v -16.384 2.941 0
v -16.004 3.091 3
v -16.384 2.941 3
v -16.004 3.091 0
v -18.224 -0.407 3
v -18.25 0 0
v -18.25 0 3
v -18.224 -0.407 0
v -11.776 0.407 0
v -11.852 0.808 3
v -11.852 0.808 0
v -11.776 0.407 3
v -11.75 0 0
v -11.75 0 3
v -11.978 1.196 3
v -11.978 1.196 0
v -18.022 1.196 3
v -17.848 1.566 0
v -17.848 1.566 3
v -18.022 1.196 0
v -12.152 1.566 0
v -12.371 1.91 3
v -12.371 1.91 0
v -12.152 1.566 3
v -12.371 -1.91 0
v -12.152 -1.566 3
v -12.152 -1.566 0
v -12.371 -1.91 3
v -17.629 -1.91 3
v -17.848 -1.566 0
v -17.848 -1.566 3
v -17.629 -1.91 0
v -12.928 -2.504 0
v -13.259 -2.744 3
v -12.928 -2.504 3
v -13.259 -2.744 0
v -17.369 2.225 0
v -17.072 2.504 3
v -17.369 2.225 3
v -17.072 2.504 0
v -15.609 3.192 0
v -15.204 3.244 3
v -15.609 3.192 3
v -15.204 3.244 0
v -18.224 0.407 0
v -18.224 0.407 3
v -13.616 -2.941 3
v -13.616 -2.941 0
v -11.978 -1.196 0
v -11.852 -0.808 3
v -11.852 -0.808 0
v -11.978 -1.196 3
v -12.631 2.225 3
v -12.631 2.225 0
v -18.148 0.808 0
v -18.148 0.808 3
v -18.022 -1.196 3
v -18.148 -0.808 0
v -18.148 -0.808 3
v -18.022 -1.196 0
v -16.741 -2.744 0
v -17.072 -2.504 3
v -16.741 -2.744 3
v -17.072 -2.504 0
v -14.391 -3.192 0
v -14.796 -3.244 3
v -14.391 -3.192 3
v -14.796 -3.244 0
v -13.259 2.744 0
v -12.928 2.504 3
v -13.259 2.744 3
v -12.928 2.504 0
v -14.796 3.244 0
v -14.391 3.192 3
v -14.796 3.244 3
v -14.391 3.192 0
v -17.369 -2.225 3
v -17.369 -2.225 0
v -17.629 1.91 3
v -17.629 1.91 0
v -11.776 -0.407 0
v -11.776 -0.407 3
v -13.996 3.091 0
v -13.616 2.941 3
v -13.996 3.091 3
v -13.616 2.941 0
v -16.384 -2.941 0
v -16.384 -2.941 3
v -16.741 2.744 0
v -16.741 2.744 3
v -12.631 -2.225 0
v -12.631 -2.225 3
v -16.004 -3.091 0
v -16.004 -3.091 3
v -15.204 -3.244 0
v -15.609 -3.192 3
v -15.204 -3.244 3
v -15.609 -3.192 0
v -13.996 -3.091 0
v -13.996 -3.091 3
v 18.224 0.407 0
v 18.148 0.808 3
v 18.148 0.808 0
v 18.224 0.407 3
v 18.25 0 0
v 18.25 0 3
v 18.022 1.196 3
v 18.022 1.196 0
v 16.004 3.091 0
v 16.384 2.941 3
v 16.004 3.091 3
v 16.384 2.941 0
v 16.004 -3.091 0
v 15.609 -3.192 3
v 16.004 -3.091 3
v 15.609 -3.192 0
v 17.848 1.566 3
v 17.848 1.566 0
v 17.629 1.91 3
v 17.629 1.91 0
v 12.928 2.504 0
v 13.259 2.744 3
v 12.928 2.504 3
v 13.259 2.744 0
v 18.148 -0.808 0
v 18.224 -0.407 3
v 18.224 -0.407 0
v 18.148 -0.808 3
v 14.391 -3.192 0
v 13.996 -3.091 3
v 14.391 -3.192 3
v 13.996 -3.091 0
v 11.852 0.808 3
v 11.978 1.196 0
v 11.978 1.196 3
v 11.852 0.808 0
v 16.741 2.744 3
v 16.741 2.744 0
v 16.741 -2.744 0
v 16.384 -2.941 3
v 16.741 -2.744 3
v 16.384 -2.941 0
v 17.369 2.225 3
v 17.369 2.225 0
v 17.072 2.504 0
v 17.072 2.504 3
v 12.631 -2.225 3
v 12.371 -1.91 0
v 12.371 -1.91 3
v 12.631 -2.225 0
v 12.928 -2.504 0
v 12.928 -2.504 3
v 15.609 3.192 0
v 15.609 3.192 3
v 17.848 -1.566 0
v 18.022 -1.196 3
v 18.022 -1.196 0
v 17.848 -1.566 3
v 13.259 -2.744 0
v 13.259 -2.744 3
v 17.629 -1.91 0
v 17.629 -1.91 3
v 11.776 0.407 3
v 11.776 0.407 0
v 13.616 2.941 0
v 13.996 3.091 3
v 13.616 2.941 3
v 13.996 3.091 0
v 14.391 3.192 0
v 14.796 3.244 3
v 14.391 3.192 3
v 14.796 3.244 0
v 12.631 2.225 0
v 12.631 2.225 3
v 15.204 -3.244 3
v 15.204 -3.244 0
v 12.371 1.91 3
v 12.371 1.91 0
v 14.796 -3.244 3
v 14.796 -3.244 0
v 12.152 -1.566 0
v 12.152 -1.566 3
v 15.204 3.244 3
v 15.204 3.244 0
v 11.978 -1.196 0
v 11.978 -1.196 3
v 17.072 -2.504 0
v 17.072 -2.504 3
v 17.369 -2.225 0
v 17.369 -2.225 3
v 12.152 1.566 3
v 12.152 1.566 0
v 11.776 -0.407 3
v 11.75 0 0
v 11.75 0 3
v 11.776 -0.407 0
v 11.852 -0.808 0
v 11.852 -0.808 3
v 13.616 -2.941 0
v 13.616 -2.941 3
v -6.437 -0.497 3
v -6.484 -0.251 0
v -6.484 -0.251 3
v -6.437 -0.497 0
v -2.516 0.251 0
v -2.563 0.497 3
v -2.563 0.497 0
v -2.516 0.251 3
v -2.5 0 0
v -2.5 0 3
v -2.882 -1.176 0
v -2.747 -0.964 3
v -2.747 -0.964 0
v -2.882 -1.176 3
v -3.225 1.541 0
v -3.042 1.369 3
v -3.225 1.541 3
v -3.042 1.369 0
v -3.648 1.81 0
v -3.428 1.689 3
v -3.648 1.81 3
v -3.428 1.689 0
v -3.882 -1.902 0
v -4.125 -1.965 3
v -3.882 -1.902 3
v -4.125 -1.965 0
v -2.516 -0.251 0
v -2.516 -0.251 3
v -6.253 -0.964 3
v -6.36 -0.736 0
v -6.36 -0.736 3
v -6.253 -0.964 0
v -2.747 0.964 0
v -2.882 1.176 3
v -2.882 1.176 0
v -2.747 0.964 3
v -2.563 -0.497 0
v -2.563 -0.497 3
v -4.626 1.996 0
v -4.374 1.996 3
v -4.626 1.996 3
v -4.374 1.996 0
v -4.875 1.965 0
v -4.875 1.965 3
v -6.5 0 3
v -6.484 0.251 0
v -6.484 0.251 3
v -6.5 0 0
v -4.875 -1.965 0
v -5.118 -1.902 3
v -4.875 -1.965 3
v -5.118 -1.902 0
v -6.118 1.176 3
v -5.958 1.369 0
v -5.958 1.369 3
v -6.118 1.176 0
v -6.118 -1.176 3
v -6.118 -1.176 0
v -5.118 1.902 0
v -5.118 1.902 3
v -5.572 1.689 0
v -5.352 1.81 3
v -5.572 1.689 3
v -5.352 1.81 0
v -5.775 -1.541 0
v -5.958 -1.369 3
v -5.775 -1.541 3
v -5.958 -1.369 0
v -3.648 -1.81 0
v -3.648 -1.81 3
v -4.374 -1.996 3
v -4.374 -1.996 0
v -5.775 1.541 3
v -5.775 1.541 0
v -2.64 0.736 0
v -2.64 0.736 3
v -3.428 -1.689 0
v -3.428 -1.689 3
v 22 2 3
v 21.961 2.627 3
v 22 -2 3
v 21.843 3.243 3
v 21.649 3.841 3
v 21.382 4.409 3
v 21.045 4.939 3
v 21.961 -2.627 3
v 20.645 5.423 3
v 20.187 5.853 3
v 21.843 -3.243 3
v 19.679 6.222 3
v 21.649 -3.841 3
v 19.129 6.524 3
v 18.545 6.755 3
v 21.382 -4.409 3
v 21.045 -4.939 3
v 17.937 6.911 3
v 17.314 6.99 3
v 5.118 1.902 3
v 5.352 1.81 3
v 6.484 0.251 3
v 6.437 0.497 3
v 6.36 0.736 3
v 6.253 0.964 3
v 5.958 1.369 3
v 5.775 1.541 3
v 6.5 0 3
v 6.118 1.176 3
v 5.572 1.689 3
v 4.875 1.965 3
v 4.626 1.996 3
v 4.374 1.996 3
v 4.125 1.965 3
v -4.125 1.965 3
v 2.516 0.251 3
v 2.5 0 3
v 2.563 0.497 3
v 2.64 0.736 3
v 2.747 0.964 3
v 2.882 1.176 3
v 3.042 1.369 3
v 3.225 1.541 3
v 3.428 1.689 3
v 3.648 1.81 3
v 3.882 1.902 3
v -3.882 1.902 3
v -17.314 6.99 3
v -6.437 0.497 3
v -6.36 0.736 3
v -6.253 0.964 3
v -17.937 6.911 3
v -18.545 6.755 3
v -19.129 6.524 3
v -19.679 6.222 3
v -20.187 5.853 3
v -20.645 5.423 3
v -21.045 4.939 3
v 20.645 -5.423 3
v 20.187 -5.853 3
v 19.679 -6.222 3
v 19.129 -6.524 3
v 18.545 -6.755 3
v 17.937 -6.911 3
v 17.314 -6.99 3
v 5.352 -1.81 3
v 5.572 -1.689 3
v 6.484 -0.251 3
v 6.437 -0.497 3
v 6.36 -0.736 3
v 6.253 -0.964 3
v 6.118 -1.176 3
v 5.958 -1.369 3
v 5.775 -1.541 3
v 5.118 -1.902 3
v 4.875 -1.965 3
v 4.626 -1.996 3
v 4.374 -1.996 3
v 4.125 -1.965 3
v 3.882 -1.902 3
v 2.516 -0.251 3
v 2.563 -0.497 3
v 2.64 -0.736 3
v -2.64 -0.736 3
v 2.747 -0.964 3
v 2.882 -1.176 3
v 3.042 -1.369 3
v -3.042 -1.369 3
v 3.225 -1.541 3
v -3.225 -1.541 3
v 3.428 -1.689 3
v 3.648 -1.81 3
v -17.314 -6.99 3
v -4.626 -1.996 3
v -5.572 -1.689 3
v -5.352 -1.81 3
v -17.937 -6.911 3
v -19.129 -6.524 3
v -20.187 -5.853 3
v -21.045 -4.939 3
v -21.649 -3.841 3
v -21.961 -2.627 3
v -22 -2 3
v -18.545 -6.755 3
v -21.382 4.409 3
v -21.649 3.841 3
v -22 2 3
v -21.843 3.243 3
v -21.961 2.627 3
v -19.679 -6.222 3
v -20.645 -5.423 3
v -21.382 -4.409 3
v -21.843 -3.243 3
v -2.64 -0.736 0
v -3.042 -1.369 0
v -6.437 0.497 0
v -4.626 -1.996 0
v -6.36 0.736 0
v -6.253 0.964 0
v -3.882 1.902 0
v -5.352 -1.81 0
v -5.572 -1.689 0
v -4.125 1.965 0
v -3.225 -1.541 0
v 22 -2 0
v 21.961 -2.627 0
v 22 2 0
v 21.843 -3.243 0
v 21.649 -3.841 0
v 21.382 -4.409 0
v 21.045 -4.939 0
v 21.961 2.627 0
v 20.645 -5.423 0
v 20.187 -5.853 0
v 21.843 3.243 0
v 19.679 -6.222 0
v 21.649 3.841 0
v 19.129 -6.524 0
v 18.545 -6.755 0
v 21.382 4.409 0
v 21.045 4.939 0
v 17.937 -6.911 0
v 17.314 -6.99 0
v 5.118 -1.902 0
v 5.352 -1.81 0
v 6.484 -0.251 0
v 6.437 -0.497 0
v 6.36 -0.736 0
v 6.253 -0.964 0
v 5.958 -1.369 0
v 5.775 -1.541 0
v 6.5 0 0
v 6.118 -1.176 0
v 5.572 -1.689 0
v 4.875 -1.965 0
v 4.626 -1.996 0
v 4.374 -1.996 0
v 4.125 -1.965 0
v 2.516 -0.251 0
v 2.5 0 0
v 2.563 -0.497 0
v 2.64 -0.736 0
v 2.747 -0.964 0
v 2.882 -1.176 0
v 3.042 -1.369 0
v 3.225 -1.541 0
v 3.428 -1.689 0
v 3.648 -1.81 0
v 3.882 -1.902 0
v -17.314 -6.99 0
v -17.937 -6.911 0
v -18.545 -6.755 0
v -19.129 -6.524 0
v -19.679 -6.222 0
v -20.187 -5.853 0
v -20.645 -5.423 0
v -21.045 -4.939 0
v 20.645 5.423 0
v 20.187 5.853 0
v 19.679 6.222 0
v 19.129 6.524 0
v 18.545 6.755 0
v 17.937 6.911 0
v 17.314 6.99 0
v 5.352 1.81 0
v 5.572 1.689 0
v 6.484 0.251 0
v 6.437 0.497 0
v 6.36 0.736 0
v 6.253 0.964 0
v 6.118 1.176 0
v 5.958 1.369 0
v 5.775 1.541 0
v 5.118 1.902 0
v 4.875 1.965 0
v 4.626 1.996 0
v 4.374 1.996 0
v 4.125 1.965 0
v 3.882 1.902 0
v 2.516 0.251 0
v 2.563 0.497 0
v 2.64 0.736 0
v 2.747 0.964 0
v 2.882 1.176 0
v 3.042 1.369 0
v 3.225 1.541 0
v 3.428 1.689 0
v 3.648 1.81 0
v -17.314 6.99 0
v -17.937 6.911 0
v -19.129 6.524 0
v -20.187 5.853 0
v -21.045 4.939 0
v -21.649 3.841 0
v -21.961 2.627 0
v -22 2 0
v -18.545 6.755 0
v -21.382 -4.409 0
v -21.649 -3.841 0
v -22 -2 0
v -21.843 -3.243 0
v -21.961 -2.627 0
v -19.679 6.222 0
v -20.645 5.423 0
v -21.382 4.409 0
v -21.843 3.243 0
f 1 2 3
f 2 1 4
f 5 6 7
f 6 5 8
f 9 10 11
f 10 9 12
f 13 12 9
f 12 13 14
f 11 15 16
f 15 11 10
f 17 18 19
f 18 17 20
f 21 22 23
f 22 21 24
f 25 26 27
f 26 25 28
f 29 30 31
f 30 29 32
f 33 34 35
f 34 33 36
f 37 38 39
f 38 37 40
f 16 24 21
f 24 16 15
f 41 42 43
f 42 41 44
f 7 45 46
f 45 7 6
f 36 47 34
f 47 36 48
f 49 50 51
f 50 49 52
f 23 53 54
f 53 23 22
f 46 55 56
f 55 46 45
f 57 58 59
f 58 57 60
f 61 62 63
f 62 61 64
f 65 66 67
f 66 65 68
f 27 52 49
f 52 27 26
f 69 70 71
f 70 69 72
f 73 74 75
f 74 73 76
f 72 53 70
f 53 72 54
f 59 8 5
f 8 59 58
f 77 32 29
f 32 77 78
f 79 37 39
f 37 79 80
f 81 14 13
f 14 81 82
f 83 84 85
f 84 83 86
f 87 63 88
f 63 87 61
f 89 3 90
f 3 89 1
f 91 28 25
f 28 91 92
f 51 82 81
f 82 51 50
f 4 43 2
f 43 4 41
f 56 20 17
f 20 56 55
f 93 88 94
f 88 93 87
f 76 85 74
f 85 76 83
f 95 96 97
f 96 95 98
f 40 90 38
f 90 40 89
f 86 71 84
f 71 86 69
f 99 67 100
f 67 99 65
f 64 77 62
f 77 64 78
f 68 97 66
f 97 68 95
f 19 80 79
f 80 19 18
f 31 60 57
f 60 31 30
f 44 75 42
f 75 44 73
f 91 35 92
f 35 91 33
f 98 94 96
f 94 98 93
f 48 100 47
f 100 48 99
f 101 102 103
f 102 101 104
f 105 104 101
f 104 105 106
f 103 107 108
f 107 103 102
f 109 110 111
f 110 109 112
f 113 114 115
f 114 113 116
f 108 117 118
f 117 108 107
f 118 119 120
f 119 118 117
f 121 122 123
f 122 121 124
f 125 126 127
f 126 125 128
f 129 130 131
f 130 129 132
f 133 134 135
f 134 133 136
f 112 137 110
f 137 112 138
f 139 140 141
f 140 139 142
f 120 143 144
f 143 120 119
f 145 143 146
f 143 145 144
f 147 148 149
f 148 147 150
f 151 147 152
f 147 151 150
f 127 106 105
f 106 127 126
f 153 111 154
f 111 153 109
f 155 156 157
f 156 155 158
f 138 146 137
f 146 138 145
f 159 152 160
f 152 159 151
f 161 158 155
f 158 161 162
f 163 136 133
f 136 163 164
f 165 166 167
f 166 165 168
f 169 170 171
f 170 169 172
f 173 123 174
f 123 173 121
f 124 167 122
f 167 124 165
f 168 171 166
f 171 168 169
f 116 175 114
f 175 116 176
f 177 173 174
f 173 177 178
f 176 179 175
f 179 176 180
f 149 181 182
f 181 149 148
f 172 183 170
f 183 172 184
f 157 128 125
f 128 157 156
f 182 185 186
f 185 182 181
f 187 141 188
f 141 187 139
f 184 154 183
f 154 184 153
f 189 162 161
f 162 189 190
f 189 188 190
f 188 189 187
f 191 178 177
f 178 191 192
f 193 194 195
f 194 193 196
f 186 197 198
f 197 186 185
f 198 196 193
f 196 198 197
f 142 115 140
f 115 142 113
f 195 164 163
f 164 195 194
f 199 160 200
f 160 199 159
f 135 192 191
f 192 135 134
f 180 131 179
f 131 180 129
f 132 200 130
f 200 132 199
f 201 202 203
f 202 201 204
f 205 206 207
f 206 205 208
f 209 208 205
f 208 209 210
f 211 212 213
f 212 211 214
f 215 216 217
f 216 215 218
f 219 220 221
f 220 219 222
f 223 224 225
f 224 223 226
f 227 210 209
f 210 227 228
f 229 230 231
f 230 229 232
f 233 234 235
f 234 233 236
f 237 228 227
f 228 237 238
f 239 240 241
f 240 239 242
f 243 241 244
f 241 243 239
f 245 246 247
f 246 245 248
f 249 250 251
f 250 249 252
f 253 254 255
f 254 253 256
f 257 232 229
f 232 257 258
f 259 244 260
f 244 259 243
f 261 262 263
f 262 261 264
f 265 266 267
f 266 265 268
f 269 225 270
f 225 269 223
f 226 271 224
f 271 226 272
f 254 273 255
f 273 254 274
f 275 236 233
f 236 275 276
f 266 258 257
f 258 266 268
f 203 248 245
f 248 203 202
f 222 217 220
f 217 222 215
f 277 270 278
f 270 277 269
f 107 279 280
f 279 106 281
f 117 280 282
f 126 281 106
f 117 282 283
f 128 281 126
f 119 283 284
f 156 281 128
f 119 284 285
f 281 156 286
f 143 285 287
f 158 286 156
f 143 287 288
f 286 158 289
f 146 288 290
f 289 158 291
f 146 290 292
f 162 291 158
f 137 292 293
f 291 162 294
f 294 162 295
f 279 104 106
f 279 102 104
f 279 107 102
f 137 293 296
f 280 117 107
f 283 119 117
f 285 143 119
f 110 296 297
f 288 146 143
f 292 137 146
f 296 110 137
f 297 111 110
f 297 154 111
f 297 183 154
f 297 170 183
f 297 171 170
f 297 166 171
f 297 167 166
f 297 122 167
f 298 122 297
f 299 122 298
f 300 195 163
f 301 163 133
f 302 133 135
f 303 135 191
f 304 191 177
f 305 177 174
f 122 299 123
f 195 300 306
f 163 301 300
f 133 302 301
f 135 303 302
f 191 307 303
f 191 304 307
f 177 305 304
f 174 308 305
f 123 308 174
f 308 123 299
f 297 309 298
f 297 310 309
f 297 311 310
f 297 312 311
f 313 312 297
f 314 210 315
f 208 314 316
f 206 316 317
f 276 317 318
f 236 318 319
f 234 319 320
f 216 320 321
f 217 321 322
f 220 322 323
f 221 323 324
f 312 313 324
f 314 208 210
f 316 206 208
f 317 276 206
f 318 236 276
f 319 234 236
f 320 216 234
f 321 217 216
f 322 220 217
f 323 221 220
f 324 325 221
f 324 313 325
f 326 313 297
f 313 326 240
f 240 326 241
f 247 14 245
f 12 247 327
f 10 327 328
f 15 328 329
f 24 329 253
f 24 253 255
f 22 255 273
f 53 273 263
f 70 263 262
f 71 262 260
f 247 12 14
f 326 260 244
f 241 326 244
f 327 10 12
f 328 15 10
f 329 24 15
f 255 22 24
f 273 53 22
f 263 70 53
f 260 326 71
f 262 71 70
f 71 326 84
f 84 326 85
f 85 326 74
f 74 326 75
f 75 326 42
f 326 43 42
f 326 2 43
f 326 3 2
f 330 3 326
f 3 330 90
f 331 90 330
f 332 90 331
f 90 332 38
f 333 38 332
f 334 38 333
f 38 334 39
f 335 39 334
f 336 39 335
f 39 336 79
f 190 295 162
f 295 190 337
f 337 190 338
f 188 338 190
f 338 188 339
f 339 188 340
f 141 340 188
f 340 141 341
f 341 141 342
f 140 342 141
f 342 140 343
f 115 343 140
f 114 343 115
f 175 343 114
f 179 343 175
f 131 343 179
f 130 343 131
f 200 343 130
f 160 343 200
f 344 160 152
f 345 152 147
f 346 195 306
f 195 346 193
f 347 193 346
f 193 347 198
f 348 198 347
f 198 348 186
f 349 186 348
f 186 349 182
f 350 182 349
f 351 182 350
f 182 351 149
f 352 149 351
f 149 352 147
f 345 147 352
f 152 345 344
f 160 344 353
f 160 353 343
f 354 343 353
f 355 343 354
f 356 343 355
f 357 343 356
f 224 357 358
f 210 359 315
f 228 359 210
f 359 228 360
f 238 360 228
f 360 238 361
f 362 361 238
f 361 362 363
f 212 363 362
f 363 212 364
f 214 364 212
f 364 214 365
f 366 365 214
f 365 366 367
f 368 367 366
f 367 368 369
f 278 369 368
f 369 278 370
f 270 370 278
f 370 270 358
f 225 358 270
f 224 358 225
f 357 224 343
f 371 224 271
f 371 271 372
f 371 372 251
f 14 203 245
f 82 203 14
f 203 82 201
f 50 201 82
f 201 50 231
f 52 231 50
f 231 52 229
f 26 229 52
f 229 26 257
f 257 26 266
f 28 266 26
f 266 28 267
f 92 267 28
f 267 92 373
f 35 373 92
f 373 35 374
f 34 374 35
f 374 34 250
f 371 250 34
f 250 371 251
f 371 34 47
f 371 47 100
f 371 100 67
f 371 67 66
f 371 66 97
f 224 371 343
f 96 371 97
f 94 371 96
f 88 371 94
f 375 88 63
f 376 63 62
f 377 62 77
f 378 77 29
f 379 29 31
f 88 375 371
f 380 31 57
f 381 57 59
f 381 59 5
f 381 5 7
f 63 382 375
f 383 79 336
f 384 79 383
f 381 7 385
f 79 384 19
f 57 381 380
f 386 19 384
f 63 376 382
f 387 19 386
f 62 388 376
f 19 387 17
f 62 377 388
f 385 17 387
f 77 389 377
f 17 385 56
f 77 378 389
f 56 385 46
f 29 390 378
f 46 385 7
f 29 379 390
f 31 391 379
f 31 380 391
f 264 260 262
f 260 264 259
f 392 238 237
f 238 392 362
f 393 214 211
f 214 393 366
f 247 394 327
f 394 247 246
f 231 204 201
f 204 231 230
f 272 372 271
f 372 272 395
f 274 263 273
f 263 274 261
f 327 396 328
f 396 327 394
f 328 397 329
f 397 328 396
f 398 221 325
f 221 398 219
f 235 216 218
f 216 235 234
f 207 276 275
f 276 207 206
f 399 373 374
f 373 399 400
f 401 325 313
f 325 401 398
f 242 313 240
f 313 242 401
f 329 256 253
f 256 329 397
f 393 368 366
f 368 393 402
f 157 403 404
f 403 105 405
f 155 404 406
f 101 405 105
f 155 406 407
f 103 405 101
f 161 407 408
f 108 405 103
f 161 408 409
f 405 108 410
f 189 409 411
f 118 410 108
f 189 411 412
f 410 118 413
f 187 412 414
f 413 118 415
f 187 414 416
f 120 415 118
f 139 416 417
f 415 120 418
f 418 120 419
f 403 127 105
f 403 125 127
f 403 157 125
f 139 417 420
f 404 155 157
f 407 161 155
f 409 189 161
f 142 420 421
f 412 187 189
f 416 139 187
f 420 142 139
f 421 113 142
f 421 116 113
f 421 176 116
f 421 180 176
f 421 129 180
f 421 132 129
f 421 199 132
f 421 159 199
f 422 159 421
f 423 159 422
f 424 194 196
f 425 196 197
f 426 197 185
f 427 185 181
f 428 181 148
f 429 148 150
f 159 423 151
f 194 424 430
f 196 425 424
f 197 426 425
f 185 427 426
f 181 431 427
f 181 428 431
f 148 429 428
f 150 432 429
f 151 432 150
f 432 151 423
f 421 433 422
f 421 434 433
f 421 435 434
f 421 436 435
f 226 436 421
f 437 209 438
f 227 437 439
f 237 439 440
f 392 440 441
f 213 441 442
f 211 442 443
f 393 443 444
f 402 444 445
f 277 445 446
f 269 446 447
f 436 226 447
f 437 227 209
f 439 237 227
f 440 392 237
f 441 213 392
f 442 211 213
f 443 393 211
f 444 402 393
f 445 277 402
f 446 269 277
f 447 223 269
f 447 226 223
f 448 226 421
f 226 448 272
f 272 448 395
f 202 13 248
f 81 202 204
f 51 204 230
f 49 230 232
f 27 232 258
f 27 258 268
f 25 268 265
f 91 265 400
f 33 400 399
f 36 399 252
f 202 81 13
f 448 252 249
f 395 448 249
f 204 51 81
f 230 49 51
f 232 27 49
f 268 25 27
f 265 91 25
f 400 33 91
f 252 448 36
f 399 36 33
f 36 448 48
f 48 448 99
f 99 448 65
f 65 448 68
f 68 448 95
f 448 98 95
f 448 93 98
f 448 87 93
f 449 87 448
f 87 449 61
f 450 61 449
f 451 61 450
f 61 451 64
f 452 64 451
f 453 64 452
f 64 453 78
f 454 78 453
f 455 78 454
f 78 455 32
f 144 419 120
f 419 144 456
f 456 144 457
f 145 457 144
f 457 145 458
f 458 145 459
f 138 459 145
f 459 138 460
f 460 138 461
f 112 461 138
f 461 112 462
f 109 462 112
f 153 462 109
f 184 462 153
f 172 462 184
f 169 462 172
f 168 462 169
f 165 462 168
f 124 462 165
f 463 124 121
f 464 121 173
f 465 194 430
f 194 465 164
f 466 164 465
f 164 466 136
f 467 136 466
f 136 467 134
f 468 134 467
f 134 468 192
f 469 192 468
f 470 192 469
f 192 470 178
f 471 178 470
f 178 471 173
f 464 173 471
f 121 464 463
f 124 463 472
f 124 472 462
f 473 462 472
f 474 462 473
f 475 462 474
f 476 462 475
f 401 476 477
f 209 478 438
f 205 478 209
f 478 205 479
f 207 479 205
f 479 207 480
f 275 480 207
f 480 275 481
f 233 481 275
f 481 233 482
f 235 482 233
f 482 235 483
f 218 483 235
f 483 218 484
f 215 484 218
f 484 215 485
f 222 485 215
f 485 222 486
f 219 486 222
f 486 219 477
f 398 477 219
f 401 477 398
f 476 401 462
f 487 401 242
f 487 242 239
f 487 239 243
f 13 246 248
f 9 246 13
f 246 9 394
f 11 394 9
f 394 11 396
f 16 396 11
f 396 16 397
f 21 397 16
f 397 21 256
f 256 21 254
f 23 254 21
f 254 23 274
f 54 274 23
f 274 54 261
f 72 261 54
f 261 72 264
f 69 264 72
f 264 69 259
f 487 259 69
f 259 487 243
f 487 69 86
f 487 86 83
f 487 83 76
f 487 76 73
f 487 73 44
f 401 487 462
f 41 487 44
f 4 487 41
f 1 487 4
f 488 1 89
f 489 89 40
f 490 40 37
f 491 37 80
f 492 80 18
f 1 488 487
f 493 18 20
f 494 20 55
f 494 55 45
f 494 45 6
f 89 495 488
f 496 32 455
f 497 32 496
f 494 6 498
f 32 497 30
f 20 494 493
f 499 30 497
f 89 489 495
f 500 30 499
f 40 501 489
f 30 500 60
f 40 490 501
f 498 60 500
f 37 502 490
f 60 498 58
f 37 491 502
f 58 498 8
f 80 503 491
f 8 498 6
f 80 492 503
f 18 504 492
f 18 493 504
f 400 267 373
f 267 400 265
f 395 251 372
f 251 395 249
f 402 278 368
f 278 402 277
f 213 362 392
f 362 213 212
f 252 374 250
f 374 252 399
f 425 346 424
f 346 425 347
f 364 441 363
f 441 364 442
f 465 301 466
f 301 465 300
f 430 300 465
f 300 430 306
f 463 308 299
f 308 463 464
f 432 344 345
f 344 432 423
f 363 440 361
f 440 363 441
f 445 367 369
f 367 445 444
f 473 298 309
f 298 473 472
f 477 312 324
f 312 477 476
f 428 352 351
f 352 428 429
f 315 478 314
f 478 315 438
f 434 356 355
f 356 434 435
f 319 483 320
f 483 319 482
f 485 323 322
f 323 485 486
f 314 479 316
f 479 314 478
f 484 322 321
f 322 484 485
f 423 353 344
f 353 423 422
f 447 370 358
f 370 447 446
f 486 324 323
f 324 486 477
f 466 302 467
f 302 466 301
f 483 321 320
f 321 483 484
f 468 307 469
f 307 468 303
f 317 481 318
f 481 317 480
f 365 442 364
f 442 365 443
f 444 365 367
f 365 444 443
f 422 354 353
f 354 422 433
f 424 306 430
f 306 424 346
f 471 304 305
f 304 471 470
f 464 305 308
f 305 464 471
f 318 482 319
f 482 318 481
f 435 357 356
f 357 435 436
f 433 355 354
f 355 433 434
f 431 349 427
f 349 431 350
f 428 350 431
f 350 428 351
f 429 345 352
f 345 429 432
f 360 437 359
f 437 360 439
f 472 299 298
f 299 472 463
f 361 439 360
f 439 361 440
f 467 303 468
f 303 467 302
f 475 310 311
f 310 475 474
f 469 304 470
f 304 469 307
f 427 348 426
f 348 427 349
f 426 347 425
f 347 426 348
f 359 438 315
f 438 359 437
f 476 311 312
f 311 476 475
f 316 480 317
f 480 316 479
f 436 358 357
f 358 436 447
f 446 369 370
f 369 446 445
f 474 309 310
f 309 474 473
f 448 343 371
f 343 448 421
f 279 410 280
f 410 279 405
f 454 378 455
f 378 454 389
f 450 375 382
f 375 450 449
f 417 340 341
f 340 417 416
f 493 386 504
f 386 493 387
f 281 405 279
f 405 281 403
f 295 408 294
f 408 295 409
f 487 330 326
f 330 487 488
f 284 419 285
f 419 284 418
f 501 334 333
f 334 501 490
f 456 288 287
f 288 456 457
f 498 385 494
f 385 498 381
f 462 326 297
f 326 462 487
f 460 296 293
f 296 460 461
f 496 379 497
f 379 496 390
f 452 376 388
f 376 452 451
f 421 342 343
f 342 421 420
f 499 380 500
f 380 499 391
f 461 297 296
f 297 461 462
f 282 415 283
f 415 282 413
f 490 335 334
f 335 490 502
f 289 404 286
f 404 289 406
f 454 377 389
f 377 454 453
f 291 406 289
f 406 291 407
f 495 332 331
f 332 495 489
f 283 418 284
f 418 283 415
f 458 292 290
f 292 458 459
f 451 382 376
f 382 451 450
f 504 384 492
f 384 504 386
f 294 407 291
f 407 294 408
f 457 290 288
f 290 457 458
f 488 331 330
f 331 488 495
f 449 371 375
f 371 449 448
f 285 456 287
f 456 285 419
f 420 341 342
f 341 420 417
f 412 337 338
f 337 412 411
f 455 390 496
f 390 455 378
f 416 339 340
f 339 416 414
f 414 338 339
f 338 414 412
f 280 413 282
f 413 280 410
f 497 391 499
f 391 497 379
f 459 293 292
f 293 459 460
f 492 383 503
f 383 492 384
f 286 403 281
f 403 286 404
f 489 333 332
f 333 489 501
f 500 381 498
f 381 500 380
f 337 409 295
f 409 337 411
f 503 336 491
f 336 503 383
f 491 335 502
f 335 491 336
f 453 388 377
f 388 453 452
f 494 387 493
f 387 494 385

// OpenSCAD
$fn = 50;


difference() {
	union() {
		hull() {
			translate(v = [-17.0000000000, 2.0000000000, 0]) {
				cylinder(h = 3, r = 5);
			}
			translate(v = [17.0000000000, 2.0000000000, 0]) {
				cylinder(h = 3, r = 5);
			}
			translate(v = [-17.0000000000, -2.0000000000, 0]) {
				cylinder(h = 3, r = 5);
			}
			translate(v = [17.0000000000, -2.0000000000, 0]) {
				cylinder(h = 3, r = 5);
			}
		}
	}
	union() {
		#translate(v = [-15.0000000000, 0.0000000000, 0]) {
			cylinder(h = 3, r = 3.2500000000);
		}
		#translate(v = [15.0000000000, 0.0000000000, 0]) {
			cylinder(h = 3, r = 3.2500000000);
		}
		#translate(v = [-15.0000000000, 0.0000000000, -100.0000000000]) {
			cylinder(h = 200, r = 3.2500000000);
		}
		#translate(v = [-15.0000000000, 0.0000000000, -100.0000000000]) {
			cylinder(h = 200, r = 3.2500000000);
		}
		#translate(v = [15.0000000000, 0.0000000000, -100.0000000000]) {
			cylinder(h = 200, r = 3.2500000000);
		}
		#translate(v = [15.0000000000, 0.0000000000, -100.0000000000]) {
			cylinder(h = 200, r = 3.2500000000);
		}
		#translate(v = [-15.0000000000, 0.0000000000, 0]) {
			cylinder(h = 3, r = 1.8000000000);
		}
		#translate(v = [15.0000000000, 0.0000000000, 0]) {
			cylinder(h = 3, r = 1.8000000000);
		}
		#translate(v = [-15.0000000000, 0.0000000000, 0]) {
			cylinder(h = 3, r = 1.8000000000);
		}
		#translate(v = [15.0000000000, 0.0000000000, 0]) {
			cylinder(h = 3, r = 1.8000000000);
		}
		#translate(v = [-15.0000000000, 0.0000000000, 0]) {
			cylinder(h = 3, r = 1.8000000000);
		}
		#translate(v = [15.0000000000, 0.0000000000, 0]) {
			cylinder(h = 3, r = 1.8000000000);
		}
		#translate(v = [-4.5000000000, 0, 0]) {
			cylinder(h = 3, r = 2.0000000000);
		}
		#translate(v = [4.5000000000, 0, 0]) {
			cylinder(h = 3, r = 2.0000000000);
		}
	}
}
